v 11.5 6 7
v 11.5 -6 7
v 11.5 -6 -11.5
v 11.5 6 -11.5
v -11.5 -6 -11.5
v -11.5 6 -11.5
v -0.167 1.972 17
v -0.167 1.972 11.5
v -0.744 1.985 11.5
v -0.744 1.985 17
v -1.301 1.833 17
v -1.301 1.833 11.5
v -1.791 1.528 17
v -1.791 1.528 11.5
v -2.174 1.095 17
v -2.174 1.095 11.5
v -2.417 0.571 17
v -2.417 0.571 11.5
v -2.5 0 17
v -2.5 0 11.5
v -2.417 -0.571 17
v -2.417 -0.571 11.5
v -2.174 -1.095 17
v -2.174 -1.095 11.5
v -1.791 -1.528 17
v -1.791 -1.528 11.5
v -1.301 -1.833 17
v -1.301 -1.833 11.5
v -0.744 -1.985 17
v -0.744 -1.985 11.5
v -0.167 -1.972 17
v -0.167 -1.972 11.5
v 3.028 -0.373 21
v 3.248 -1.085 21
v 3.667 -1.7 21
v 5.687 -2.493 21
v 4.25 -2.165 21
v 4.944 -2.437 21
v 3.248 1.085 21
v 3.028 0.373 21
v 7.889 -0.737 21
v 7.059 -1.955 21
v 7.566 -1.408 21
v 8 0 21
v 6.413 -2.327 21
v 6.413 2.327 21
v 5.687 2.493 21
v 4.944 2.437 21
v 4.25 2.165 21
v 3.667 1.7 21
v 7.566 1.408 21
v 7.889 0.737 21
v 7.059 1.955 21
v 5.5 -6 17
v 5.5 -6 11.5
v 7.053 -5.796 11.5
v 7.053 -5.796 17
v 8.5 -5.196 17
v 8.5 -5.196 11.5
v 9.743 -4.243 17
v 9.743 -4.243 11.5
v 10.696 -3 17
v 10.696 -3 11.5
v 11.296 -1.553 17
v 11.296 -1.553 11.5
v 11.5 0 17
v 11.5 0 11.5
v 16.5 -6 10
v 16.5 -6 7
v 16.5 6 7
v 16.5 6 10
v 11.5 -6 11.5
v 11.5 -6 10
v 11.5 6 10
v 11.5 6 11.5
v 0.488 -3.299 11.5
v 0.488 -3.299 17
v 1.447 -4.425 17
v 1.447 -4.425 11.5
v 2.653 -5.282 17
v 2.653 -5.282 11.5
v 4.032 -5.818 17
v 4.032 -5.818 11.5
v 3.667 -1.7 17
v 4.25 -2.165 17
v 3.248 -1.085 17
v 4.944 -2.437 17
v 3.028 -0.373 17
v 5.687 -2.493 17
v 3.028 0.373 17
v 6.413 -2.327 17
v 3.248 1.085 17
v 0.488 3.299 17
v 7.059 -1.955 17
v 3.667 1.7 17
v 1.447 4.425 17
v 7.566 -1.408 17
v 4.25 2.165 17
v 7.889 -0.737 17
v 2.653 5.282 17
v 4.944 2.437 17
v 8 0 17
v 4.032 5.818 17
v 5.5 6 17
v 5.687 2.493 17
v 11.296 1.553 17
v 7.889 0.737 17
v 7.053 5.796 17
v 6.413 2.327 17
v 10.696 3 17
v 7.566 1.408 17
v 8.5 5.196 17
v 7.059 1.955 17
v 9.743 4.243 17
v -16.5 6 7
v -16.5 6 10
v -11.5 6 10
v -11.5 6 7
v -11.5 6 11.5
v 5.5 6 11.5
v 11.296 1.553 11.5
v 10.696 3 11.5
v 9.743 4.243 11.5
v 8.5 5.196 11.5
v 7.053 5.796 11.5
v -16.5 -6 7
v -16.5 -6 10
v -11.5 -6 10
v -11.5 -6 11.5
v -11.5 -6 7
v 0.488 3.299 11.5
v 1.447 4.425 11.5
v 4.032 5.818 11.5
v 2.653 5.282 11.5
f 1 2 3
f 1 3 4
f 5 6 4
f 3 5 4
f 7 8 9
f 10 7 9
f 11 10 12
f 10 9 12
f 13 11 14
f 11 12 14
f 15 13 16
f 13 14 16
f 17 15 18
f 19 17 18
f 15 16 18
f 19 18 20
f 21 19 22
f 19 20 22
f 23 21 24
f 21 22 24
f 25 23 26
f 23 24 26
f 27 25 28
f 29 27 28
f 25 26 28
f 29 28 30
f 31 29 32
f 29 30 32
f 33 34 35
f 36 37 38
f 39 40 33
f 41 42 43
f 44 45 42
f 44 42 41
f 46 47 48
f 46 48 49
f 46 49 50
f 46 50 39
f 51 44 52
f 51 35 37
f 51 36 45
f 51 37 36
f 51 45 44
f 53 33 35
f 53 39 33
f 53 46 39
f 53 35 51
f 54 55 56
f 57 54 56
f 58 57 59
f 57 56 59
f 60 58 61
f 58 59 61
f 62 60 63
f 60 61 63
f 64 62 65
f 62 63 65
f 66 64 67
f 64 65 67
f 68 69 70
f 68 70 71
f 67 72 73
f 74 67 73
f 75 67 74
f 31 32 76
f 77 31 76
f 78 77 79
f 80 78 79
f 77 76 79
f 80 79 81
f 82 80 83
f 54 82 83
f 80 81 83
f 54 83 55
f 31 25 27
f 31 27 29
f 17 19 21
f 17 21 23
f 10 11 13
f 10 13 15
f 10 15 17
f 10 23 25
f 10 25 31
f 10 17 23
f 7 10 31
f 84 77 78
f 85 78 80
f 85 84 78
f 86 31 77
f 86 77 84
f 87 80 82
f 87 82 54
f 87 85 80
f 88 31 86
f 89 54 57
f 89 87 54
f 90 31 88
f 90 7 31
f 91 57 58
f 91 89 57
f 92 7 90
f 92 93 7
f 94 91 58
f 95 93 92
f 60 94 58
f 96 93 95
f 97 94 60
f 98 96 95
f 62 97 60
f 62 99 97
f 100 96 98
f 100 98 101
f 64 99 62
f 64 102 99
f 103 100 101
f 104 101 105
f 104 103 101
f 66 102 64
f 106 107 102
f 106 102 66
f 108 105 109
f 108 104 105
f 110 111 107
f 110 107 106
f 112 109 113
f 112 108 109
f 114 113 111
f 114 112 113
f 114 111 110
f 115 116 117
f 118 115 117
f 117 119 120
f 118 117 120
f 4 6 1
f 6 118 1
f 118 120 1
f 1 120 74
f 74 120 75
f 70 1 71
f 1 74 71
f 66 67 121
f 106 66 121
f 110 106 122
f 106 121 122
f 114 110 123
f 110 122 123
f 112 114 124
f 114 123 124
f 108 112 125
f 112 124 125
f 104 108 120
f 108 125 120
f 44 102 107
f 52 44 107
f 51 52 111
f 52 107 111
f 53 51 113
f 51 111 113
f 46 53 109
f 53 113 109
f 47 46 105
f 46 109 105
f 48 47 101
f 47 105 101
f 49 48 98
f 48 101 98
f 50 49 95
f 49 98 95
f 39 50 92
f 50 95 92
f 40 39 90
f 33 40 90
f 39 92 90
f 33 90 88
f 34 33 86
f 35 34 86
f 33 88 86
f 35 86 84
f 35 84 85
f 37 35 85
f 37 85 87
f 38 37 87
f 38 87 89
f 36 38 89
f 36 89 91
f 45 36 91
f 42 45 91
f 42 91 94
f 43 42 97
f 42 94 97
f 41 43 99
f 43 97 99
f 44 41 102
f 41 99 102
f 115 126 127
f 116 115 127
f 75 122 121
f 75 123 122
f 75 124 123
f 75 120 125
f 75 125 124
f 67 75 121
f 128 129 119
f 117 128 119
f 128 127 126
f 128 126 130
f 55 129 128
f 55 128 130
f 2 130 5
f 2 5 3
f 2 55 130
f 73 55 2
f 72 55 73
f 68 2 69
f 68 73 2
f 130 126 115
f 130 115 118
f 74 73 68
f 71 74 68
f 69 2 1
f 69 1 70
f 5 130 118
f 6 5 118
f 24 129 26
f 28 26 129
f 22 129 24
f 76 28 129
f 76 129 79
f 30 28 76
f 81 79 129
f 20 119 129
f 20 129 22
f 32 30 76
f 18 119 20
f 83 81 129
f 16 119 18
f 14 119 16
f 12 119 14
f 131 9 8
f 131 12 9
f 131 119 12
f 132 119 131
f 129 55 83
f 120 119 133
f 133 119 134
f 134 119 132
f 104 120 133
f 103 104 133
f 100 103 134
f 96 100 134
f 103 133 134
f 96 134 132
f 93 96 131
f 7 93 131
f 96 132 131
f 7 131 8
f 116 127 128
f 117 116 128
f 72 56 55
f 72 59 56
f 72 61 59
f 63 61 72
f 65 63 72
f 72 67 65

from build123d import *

# Parameters (mm, degrees)
F0_W     = 23
F0_H     = 12
F1_DEPTH = 11.5
F3_DEPTH = 5.5
F4_R     = 2.5
F5_DEPTH = 4
F6_W     = 5
F6_H     = 3
F7_DEPTH = 12


with BuildPart() as f1:
    # F0 (on Top) → F1 (new body, symmetric)
    with BuildSketch(Plane.XY):
        Rectangle(F0_W, F0_H)
    extrude(amount=F1_DEPTH, both=True)

    # F2 (on face) → F3 (join)
    with BuildSketch(Plane.XY.offset(11.5)):
        with BuildLine():
            ThreePointArc((5.5, -6), (9.7426406871, -4.2426406871), (11.5, 0))
            ThreePointArc((11.5, 0), (9.7426406871, 4.2426406871), (5.5, 6))
            ThreePointArc((5.5, 6), (2.0238066485, 4.8904069139), (-0.1666666667, 1.9720265944))
            ThreePointArc((-0.1666666667, 1.9720265944), (1.0275252317, 1.2909944487), (1.5, 0))
            ThreePointArc((1.5, 0), (1.0275252317, -1.2909944487), (-0.1666666667, -1.9720265944))
            ThreePointArc((-0.1666666667, -1.9720265944), (2.0238066485, -4.8904069139), (5.5, -6))
        make_face()
        with BuildLine():
            ThreePointArc((1.5, 0), (1.0275252317, 1.2909944487), (-0.1666666667, 1.9720265944))
            ThreePointArc((-0.1666666667, 1.9720265944), (-0.5, 0), (-0.1666666667, -1.9720265944))
            ThreePointArc((-0.1666666667, -1.9720265944), (1.0275252317, -1.2909944487), (1.5, 0))
        make_face()
        with BuildLine():
            ThreePointArc((-0.1666666667, -1.9720265944), (-0.5, 0), (-0.1666666667, 1.9720265944))
            ThreePointArc((-0.1666666667, 1.9720265944), (-2.5, 0), (-0.1666666667, -1.9720265944))
        make_face()
    extrude(amount=F3_DEPTH)

    # F4 (on face) → F5 (join)
    with BuildSketch(Plane.XY.offset(17)):
        with Locations((5.5, 0)):
            Circle(F4_R)
    extrude(amount=F5_DEPTH)

    # F6 (on face) → F7 (join)
    with BuildSketch(Plane.XZ.offset(6)):
        with Locations((-14, 8.5)):
            Rectangle(F6_W, F6_H)
        with Locations((14, 8.5)):
            Rectangle(F6_W, F6_H)
    extrude(amount=-F7_DEPTH)


solid = f1.part
